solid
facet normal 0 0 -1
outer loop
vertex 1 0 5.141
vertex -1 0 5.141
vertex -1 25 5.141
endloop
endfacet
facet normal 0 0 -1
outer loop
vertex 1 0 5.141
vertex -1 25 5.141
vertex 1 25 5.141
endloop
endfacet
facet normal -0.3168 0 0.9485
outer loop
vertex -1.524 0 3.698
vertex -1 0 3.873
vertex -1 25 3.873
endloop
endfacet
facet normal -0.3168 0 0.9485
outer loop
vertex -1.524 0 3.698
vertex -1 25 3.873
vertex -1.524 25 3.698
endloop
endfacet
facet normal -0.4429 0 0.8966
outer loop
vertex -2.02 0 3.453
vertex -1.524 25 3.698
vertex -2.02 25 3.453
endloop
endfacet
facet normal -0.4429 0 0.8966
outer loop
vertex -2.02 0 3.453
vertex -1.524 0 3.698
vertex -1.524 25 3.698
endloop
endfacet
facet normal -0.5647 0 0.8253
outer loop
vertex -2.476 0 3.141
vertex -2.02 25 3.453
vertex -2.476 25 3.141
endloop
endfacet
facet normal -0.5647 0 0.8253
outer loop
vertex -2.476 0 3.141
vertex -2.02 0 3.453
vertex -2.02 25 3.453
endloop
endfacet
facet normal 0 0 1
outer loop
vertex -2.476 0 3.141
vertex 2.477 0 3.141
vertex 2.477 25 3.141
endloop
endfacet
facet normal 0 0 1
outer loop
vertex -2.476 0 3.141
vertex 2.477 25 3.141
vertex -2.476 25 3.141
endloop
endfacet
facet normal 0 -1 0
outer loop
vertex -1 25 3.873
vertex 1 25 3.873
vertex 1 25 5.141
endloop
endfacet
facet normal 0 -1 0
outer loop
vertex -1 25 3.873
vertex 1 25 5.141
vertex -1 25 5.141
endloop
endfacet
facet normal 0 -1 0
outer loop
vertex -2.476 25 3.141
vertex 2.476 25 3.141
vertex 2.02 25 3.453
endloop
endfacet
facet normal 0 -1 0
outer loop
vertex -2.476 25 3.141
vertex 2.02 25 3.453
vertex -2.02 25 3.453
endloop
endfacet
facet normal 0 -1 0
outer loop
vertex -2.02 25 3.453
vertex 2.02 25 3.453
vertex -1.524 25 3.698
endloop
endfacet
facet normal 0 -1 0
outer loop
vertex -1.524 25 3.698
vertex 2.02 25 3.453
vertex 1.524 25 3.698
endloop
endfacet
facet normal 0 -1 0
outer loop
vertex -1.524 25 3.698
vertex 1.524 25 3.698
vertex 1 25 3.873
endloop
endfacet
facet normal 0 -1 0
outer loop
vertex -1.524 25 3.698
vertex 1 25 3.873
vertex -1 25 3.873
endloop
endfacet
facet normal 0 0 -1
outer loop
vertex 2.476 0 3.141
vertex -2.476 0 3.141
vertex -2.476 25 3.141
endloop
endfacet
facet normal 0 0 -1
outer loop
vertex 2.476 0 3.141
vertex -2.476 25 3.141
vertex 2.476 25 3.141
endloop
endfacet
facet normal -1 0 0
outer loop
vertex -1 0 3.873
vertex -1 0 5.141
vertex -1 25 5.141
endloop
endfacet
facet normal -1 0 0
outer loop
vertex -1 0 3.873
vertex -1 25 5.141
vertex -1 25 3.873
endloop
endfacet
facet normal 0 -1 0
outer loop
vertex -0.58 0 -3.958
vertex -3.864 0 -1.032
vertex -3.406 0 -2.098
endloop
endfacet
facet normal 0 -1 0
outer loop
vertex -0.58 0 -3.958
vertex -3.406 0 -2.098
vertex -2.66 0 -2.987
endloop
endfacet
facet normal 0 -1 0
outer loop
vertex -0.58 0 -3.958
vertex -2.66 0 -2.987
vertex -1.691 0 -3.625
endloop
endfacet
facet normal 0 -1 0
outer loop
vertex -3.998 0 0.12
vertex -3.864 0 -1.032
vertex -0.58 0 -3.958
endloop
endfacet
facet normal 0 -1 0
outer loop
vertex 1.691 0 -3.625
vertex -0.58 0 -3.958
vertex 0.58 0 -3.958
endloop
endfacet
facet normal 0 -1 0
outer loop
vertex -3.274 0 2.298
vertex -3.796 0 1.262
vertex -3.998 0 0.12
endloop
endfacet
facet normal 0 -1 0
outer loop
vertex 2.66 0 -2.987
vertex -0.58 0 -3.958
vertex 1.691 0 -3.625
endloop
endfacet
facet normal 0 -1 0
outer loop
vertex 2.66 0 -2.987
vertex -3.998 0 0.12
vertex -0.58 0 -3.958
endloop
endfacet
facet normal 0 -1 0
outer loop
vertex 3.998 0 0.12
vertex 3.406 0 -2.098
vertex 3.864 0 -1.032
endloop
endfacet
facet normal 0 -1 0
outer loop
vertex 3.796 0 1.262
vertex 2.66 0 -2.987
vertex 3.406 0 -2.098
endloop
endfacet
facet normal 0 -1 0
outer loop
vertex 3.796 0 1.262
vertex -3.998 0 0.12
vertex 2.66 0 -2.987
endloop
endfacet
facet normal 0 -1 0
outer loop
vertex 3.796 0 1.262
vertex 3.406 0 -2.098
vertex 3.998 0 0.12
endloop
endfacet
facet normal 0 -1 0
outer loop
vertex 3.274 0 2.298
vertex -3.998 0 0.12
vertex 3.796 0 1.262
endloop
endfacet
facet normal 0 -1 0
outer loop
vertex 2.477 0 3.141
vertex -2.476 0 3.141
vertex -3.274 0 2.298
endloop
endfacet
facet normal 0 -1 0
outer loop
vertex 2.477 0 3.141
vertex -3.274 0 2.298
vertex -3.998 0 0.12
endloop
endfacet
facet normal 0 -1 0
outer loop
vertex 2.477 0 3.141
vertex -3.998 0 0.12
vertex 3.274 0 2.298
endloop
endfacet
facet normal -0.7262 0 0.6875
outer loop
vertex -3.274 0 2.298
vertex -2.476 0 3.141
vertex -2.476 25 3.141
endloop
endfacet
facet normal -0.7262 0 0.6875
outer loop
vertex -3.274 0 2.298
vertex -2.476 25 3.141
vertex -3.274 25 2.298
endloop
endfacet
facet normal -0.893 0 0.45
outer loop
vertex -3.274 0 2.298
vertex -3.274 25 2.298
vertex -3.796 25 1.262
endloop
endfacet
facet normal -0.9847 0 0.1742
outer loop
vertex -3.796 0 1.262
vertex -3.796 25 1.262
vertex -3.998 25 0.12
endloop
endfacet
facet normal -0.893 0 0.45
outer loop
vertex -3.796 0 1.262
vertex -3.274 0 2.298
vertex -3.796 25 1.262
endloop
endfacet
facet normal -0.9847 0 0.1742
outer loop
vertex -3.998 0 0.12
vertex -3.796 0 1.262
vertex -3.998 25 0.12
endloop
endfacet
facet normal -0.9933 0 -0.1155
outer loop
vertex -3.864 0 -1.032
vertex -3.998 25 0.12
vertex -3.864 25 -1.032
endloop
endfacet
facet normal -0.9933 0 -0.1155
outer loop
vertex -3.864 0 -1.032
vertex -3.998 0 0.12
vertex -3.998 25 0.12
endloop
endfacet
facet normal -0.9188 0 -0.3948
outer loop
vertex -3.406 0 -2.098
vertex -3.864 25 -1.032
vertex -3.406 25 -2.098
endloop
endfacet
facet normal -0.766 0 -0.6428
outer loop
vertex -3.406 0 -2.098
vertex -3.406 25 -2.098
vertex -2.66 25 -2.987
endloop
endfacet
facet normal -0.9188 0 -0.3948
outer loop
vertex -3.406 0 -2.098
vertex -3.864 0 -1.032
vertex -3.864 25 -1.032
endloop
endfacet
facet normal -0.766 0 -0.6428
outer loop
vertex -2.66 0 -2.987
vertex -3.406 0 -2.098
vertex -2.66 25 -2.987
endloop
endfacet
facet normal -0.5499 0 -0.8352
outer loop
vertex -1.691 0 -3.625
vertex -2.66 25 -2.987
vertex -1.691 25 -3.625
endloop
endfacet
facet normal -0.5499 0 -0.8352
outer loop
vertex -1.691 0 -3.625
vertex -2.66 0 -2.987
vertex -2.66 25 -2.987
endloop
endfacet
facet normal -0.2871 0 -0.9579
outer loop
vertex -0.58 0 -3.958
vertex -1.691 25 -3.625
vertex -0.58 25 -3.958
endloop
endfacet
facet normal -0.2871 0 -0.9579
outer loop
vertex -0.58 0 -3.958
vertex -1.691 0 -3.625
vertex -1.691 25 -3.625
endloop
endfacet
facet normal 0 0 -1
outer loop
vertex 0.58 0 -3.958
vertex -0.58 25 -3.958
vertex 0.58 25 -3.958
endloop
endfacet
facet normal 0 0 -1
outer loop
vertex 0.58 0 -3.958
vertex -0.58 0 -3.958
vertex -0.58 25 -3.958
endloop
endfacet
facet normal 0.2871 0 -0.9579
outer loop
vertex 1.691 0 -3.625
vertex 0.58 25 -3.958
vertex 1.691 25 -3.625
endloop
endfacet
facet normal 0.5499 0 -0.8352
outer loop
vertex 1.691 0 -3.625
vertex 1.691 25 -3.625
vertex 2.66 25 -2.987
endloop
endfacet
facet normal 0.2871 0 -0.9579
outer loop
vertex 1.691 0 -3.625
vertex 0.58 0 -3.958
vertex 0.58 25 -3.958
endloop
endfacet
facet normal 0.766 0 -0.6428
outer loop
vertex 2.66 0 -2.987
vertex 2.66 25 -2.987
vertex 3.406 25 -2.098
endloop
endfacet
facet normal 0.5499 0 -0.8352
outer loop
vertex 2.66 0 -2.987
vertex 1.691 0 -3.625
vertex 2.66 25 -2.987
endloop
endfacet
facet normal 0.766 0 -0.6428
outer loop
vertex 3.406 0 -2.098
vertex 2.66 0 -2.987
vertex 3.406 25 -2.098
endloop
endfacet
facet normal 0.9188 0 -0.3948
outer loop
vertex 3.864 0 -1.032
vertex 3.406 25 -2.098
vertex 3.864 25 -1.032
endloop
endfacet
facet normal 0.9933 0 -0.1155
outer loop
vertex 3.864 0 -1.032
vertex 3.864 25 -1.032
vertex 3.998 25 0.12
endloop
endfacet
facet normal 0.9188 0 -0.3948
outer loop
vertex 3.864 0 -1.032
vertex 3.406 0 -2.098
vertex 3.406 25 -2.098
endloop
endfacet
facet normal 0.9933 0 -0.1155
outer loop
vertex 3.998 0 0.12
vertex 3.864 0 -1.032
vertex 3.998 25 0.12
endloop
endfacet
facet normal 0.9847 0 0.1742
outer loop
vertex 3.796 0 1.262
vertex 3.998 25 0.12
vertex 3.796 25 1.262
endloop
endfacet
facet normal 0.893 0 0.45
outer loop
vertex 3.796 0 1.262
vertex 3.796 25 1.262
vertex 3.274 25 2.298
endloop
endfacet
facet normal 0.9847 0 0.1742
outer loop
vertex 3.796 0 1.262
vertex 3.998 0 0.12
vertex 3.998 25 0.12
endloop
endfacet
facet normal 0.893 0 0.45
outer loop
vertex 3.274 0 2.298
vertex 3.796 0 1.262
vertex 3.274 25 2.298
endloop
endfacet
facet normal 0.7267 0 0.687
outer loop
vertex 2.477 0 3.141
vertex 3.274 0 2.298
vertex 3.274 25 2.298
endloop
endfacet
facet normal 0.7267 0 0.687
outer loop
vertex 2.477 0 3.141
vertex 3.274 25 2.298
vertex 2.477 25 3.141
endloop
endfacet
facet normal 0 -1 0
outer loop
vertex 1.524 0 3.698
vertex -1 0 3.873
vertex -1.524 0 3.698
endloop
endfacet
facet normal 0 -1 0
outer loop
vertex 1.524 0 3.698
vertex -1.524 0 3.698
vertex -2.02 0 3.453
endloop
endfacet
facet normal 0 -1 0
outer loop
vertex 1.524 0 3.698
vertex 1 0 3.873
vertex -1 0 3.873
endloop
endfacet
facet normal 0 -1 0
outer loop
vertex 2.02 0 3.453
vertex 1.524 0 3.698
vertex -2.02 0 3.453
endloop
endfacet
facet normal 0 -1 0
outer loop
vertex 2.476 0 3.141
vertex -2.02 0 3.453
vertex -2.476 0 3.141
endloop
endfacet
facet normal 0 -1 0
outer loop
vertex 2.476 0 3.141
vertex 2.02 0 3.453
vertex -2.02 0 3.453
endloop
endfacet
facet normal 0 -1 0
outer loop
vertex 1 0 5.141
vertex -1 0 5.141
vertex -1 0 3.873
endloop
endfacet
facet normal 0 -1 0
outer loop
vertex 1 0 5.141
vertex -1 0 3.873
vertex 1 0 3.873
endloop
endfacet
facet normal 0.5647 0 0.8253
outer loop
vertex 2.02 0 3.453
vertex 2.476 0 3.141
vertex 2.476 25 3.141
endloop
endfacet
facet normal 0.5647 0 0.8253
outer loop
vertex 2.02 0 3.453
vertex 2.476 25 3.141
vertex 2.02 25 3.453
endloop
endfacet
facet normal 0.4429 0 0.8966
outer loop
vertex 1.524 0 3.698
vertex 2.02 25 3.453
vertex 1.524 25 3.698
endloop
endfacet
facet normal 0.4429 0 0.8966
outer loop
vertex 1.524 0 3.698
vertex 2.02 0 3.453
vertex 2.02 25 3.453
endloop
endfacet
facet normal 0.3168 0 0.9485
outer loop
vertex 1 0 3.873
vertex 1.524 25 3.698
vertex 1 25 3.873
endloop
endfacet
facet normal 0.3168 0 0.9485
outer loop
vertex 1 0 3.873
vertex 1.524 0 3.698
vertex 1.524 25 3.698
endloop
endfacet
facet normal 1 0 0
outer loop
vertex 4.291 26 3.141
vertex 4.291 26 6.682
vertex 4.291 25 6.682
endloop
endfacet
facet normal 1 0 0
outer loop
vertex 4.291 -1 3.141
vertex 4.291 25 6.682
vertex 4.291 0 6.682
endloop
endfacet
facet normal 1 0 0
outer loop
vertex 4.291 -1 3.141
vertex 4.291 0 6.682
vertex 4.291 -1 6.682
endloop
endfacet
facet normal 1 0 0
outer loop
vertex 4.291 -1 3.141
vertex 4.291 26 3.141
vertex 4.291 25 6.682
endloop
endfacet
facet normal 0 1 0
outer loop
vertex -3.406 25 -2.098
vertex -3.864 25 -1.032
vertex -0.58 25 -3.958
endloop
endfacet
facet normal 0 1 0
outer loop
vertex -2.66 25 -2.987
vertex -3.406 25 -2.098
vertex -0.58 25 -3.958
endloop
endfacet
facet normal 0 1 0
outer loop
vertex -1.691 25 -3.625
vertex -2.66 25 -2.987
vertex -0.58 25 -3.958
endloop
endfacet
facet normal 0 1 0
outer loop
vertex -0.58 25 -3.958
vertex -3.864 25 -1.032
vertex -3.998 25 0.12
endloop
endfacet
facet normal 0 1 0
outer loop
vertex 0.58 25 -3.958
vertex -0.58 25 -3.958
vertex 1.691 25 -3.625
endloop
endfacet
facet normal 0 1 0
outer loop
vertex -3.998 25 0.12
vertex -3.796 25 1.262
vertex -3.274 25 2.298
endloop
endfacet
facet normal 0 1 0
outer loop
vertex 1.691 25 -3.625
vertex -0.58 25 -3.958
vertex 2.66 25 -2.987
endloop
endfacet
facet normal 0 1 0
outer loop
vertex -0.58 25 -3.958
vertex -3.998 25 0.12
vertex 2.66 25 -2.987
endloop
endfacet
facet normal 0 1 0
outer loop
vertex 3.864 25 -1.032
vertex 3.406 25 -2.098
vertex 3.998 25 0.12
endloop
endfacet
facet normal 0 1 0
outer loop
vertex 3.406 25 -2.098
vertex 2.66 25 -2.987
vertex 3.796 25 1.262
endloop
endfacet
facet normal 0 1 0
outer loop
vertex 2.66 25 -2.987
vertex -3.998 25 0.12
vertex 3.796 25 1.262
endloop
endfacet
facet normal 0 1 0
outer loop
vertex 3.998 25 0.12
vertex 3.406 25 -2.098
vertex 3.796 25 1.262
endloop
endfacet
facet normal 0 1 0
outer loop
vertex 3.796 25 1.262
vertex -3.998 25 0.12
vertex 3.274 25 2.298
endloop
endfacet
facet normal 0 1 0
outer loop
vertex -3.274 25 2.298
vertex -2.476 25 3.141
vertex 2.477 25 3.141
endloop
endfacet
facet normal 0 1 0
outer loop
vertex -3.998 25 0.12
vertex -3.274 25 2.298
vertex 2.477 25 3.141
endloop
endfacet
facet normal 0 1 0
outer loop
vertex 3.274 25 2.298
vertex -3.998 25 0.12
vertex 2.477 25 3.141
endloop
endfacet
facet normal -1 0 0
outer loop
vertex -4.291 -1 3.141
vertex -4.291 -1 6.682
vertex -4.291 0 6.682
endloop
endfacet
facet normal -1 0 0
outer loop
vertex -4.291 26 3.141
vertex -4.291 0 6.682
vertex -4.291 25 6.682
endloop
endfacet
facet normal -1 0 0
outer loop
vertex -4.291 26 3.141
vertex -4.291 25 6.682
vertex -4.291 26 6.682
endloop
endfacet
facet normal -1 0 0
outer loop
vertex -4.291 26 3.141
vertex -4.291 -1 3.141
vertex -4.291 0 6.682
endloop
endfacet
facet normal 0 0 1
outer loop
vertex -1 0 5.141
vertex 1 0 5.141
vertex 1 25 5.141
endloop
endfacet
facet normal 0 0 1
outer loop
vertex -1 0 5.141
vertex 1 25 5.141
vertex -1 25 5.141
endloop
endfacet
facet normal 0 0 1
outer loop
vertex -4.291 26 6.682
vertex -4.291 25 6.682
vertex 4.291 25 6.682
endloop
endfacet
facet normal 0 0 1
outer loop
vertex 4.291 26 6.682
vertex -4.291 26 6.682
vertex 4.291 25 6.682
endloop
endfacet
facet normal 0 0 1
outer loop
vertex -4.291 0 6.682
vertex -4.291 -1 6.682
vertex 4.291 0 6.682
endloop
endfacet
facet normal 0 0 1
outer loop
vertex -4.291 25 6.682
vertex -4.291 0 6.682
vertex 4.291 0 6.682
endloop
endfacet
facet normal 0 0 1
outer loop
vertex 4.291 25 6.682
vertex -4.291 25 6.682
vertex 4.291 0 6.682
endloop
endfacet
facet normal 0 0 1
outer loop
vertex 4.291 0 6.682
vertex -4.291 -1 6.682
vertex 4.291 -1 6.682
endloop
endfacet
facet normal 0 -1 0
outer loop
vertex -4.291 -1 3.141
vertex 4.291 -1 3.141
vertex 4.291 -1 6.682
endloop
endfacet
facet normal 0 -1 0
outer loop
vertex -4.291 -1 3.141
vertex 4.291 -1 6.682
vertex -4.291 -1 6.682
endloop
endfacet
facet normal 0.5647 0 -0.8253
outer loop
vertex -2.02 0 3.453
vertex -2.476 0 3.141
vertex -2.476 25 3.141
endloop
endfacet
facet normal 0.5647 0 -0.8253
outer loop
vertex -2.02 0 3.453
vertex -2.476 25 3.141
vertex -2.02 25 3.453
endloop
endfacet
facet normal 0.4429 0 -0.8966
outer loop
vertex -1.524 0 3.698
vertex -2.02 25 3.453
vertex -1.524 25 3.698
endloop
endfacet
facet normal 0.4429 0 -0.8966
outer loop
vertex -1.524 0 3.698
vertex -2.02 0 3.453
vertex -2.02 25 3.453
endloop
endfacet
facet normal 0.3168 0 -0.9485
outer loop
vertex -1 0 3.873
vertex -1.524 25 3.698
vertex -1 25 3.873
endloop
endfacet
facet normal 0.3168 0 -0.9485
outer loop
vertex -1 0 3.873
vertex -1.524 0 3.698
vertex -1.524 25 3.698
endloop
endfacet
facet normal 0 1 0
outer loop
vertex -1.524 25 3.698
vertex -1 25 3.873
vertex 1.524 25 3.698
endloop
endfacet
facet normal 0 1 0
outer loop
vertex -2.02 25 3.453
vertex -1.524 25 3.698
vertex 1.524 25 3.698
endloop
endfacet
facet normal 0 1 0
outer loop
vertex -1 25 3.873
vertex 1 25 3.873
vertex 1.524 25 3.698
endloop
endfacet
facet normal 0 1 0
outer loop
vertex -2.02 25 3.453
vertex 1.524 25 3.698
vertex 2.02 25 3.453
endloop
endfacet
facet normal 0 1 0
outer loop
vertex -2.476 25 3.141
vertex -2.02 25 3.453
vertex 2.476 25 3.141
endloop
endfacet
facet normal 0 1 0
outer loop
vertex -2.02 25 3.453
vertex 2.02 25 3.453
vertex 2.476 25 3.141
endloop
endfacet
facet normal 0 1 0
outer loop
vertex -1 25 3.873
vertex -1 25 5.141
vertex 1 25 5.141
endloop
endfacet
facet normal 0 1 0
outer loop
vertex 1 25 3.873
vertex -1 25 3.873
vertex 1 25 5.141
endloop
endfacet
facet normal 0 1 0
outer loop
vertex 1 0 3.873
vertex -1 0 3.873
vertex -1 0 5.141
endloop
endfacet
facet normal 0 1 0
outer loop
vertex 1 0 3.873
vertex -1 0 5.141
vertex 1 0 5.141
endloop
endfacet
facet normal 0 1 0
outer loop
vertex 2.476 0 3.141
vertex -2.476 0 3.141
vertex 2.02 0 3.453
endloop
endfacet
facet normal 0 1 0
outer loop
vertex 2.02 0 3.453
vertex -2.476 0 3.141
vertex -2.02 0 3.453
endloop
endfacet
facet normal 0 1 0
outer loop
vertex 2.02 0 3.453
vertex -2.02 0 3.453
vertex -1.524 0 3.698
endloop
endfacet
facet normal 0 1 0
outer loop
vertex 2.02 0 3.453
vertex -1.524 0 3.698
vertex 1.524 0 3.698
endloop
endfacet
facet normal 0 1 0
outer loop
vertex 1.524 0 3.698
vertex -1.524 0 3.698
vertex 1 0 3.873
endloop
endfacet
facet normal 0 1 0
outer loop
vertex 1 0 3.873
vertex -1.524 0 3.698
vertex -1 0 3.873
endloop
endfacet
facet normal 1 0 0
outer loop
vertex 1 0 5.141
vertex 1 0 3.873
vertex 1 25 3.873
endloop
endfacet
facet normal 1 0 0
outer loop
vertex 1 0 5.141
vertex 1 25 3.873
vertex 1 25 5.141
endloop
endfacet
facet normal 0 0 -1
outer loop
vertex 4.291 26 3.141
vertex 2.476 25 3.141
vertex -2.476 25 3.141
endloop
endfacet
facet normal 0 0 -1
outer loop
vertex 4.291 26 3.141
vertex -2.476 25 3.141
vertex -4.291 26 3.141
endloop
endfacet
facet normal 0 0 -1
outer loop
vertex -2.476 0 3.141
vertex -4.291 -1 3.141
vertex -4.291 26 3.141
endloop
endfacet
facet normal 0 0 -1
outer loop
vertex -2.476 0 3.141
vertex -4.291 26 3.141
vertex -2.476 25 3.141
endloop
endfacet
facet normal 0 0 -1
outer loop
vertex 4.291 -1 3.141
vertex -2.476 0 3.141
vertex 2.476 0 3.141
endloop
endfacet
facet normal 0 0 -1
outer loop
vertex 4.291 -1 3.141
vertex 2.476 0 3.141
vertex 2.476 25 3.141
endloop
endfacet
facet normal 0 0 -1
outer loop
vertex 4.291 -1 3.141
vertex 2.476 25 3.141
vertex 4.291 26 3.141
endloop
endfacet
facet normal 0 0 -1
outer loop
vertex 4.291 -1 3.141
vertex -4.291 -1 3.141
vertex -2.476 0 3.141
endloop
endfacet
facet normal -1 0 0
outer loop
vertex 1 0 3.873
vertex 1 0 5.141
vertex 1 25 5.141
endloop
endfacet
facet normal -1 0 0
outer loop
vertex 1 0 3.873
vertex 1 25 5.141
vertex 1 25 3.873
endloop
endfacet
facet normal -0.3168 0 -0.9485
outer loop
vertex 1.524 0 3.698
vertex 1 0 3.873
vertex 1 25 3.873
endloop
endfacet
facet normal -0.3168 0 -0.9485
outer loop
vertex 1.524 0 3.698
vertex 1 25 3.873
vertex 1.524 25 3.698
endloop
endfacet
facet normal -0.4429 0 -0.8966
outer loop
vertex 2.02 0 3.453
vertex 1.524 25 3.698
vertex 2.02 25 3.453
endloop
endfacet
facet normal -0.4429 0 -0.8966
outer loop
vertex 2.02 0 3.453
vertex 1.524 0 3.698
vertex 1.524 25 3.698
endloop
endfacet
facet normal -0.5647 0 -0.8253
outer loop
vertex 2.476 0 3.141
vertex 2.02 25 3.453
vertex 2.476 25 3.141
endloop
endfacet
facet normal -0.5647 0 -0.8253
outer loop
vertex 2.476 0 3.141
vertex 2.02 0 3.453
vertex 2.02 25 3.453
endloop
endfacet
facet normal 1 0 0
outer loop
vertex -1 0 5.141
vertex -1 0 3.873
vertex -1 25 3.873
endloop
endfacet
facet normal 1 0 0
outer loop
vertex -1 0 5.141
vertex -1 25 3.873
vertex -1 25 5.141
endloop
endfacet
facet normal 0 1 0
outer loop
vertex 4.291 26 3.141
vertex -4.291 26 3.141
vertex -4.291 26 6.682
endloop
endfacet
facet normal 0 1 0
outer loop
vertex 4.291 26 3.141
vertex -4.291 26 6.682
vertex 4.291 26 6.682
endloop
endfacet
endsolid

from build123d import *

# Parameters (mm, degrees)
F1_DEPTH = 25
F3_DEPTH = 25
F5_DEPTH = 25
F7_DEPTH = 3.5409905045


with BuildPart() as f1:
    # F0 (on Front) → F1 (new body)
    with BuildSketch(Plane.XZ):
        with BuildLine():
            Line((2.4765, 3.141169806), (-2.4765, 3.141169806))
            ThreePointArc((-2.4765, 3.141169806), (0, -4), (2.4765, 3.141169806))
        make_face()
    extrude(amount=-F1_DEPTH)


with BuildPart() as f3:
    # F2 (on face) → F3 (new body)
    with BuildSketch(Plane.XZ):
        with BuildLine():
            ThreePointArc((-1, 3.8729833462), (-1.7763447939, 3.583936268), (-2.4765, 3.141169806))
            Line((-2.4765, 3.141169806), (2.4765, 3.141169806))
            ThreePointArc((2.4765, 3.141169806), (1.7763447939, 3.583936268), (1, 3.8729833462))
            Line((1, 3.8729833462), (1, 5.141169806))
            Line((1, 5.141169806), (-1, 5.141169806))
            Line((-1, 5.141169806), (-1, 3.8729833462))
        make_face()
    extrude(amount=-F3_DEPTH)


with BuildPart() as f5:
    # F4 (on face) → F5 (new body)
    with BuildSketch(Plane.XZ):
        with BuildLine():
            Line((-1, 3.8729833462), (-1, 5.141169806))
            Line((-1, 5.141169806), (1, 5.141169806))
            Line((1, 5.141169806), (1, 3.8729833462))
            ThreePointArc((1, 3.8729833462), (1.7763447939, 3.583936268), (2.4765, 3.141169806))
            Line((2.4765, 3.141169806), (4.2906352319, 3.141169806))
            Line((4.2906352319, 3.141169806), (4.2906352319, 6.6821603104))
            Line((4.2906352319, 6.6821603104), (0, 6.6821603104))
            Line((0, 6.6821603104), (-4.2906352319, 6.6821603104))
            Line((-4.2906352319, 6.6821603104), (-4.2906352319, 3.141169806))
            Line((-4.2906352319, 3.141169806), (-2.4765, 3.141169806))
            ThreePointArc((-2.4765, 3.141169806), (-1.7763447939, 3.583936268), (-1, 3.8729833462))
        make_face()
    extrude(amount=-F5_DEPTH)

    # F6 (on face) → F7 (join, through all)
    with BuildSketch(Plane(origin=(0, 0, 3.141169806), x_dir=(1, 0, 0), z_dir=(0, 0, -1))):
        Polygon((-4.2906352319, 0), (-2.4765, 0), (2.4765, 0), (4.2906352319, 0), (4.2906352319, 1), (-4.2906352319, 1), align=None)
        Polygon((2.4765, -25), (-2.4765, -25), (-4.2906352319, -25), (-4.2906352319, -26), (4.2906352319, -26), (4.2906352319, -25), align=None)
    extrude(amount=-F7_DEPTH)


solid = Compound([f1.part, f3.part, f5.part])
